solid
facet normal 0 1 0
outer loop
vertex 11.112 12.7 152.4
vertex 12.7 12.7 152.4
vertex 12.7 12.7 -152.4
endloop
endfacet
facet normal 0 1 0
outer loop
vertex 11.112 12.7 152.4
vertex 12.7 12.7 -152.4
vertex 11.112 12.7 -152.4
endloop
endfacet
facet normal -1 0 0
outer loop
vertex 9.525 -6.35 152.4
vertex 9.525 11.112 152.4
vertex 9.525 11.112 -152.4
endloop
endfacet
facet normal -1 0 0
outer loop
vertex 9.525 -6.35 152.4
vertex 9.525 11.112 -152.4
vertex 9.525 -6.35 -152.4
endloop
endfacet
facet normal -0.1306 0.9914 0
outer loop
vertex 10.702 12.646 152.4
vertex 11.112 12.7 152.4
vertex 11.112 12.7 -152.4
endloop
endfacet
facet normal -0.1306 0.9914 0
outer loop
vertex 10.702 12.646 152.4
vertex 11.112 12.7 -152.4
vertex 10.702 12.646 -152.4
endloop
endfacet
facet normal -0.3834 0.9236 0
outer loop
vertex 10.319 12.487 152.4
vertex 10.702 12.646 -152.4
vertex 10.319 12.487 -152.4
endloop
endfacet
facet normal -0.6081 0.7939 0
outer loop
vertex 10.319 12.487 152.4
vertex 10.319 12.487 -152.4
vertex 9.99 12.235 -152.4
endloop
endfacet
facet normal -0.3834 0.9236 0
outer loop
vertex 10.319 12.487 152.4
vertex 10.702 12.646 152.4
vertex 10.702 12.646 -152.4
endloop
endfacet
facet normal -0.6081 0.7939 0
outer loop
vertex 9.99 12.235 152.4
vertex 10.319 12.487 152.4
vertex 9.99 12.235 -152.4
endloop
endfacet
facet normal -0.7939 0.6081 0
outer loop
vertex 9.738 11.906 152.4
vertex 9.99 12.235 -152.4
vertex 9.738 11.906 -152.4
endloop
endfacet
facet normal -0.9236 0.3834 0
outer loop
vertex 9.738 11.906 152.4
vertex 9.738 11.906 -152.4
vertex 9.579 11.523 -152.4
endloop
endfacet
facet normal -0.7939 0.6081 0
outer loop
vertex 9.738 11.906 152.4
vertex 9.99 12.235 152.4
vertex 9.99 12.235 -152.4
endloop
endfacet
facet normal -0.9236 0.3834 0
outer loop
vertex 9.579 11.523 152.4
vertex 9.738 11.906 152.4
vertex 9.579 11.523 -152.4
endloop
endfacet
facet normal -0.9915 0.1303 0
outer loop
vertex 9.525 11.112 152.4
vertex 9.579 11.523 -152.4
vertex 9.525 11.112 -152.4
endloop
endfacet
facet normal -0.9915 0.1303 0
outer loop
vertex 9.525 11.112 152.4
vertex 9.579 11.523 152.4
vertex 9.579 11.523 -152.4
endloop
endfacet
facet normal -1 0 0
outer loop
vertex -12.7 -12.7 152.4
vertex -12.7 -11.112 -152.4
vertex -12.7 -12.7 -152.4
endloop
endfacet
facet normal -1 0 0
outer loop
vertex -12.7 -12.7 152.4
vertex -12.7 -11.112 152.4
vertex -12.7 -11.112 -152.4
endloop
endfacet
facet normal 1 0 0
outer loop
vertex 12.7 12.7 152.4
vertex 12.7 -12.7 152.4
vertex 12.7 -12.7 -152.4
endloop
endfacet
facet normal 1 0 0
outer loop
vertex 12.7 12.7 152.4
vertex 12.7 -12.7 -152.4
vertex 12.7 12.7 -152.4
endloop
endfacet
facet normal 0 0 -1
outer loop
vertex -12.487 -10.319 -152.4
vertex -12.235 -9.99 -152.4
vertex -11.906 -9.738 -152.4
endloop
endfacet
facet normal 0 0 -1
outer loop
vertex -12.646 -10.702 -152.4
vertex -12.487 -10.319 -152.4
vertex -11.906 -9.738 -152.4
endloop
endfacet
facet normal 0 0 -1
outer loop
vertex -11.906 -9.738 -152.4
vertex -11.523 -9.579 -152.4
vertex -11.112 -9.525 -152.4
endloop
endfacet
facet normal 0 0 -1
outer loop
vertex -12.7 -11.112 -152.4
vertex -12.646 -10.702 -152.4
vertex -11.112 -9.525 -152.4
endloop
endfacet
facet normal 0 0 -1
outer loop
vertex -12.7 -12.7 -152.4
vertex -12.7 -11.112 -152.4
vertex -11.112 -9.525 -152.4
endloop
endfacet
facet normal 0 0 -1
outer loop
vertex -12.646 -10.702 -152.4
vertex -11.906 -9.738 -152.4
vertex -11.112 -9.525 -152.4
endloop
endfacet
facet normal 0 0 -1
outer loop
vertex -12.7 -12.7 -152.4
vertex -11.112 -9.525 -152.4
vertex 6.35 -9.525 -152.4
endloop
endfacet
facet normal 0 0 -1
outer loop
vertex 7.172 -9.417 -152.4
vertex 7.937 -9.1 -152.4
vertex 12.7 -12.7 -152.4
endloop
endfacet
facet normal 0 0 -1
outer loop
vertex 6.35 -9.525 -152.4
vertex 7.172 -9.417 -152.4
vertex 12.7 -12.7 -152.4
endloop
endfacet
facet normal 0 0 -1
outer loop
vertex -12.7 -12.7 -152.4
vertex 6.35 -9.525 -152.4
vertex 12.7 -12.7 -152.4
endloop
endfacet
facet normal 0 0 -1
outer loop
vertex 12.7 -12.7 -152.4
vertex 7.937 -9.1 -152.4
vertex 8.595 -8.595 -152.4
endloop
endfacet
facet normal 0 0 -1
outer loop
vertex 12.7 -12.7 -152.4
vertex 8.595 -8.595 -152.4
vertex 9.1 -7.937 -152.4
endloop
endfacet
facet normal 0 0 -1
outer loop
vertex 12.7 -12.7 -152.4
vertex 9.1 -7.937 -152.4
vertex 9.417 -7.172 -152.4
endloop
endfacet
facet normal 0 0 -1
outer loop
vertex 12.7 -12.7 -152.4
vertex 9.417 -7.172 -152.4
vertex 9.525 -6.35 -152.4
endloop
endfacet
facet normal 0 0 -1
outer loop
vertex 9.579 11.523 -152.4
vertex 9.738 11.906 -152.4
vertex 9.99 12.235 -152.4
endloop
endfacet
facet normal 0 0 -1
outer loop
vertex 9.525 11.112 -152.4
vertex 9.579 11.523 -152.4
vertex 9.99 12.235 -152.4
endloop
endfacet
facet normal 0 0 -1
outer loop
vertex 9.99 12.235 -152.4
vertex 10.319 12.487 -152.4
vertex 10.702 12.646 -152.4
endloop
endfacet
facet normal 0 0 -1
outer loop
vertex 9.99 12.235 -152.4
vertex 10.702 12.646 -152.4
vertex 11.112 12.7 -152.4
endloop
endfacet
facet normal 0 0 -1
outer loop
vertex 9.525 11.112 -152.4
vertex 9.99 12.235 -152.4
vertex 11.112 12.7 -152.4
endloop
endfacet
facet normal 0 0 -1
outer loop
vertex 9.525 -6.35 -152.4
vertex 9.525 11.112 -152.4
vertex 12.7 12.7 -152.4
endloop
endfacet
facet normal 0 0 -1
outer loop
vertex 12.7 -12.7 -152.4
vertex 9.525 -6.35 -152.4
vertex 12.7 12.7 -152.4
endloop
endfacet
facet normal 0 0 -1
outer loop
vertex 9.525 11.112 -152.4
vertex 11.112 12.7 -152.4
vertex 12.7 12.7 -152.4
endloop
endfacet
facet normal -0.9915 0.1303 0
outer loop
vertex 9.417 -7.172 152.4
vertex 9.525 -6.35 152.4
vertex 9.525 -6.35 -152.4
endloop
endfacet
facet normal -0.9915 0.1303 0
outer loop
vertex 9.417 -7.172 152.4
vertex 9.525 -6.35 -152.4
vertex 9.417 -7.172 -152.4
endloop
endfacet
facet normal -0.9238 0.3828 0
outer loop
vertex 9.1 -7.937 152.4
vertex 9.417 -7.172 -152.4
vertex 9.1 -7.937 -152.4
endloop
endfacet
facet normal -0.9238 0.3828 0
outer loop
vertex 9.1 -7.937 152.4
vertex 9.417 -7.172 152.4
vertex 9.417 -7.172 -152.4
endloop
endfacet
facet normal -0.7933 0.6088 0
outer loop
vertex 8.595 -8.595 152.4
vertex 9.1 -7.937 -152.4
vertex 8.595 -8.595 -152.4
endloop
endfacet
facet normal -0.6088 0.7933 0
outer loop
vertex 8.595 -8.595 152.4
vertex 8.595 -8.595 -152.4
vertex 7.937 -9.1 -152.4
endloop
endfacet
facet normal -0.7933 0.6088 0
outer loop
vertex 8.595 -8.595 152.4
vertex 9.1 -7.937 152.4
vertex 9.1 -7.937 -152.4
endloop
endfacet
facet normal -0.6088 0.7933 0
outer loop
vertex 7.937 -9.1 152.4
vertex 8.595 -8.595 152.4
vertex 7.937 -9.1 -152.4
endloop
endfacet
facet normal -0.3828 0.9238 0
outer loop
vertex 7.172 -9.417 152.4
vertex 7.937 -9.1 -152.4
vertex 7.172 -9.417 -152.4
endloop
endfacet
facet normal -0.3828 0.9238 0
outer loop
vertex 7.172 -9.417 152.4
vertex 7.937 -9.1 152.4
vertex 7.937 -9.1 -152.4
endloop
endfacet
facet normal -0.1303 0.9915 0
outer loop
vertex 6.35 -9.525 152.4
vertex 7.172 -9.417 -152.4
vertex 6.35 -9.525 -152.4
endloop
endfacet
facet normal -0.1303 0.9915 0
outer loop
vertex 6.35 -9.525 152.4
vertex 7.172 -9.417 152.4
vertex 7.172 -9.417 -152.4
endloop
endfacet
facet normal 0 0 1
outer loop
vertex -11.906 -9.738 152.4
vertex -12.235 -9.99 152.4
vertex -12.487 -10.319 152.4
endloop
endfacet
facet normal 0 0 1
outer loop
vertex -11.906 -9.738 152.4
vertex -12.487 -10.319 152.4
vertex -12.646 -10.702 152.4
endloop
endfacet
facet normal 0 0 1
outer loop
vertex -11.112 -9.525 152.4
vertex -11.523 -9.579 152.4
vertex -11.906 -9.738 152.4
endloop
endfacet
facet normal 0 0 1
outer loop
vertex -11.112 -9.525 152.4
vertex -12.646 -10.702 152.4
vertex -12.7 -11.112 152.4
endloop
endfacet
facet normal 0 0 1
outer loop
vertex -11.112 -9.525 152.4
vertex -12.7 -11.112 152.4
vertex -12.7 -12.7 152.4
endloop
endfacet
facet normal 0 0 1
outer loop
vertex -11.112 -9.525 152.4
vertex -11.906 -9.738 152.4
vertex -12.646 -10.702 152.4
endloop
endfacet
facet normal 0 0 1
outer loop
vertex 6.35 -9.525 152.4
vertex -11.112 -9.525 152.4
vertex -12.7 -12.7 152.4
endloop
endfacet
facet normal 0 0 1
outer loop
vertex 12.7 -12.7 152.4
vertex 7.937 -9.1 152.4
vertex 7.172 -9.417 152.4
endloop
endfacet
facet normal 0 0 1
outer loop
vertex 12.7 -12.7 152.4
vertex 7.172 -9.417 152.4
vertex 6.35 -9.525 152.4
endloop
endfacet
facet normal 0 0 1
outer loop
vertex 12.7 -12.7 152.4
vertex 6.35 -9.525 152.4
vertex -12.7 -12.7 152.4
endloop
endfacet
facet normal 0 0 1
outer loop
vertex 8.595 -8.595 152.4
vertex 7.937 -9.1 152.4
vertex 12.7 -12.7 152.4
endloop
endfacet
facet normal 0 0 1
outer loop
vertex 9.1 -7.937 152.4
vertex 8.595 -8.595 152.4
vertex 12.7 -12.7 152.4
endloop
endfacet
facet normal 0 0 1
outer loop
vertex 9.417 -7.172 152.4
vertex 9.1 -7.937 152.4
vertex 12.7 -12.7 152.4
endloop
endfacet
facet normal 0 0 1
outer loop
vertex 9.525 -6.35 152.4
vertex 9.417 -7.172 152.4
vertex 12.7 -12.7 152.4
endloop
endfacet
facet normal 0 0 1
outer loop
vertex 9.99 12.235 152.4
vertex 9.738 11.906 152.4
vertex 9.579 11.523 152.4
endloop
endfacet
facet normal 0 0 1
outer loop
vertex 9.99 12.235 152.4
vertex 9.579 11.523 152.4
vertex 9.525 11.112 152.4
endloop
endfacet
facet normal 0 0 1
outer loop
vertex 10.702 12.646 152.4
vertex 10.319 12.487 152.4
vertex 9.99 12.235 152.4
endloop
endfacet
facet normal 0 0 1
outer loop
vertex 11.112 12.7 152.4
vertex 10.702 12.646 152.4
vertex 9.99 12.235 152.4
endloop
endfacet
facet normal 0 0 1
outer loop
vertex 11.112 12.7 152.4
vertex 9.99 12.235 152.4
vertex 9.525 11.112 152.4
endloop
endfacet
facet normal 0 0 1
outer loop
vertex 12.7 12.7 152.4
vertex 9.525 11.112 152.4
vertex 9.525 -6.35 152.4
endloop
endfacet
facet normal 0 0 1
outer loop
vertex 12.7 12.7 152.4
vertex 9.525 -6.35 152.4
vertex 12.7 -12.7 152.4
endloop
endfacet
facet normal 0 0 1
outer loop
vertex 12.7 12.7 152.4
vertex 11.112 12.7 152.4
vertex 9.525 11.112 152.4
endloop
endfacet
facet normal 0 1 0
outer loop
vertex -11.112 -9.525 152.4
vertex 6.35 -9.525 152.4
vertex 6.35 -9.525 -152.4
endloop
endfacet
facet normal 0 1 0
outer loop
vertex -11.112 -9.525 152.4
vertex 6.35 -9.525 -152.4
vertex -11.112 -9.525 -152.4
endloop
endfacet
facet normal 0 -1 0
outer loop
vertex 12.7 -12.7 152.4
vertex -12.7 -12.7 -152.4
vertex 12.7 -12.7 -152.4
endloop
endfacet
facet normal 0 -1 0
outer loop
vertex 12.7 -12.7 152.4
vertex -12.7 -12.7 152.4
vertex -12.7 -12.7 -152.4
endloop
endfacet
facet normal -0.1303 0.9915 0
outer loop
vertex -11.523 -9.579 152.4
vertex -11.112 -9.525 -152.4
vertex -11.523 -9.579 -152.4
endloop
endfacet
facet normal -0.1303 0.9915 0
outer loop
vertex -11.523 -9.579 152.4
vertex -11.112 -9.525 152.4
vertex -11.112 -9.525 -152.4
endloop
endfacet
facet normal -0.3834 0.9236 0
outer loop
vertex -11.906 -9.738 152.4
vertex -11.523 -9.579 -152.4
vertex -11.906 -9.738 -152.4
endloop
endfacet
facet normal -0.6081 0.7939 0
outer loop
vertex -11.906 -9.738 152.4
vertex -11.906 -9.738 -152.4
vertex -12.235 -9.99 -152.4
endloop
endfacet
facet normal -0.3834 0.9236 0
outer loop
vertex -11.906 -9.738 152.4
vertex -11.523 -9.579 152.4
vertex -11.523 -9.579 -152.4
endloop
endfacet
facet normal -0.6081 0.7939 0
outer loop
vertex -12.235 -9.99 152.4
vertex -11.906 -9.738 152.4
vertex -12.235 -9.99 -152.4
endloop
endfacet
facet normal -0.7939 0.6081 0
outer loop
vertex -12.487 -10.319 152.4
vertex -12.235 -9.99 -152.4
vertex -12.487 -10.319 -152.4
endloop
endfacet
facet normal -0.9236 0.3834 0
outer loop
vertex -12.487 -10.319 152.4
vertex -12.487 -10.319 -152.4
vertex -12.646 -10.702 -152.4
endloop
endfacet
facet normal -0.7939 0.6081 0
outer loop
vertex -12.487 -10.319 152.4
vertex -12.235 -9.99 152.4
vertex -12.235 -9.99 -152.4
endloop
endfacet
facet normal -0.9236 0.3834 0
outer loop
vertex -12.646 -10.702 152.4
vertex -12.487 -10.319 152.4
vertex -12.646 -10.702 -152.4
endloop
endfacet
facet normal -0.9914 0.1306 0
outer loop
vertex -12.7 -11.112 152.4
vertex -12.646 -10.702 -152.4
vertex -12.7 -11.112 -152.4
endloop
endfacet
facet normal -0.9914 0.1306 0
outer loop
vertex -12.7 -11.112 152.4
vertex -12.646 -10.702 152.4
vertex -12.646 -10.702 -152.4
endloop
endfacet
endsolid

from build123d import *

# Parameters (mm, degrees)
BOSS_EXTRUDE1_DEPTH = 152.4


with BuildPart() as part:
    # Sketch2 → Boss-Extrude1 (new, symmetric)
    with BuildSketch(Plane.XY):
        with BuildLine():
            Line((-12.7, -12.7), (12.7, -12.7))
            Line((12.7, -12.7), (12.7, 12.7))
            Line((12.7, 12.7), (11.1125, 12.7))
            ThreePointArc((11.1125, 12.7), (9.989967985, 12.235032015), (9.525, 11.1125))
            Line((9.525, 11.1125), (9.525, -6.35))
            ThreePointArc((9.525, -6.35), (8.59506403, -8.59506403), (6.35, -9.525))
            Line((6.35, -9.525), (-11.1125, -9.525))
            ThreePointArc((-11.1125, -9.525), (-12.235032015, -9.989967985), (-12.7, -11.1125))
            Line((-12.7, -11.1125), (-12.7, -12.7))
        make_face()
    extrude(amount=BOSS_EXTRUDE1_DEPTH, both=True)


solid = part.part
